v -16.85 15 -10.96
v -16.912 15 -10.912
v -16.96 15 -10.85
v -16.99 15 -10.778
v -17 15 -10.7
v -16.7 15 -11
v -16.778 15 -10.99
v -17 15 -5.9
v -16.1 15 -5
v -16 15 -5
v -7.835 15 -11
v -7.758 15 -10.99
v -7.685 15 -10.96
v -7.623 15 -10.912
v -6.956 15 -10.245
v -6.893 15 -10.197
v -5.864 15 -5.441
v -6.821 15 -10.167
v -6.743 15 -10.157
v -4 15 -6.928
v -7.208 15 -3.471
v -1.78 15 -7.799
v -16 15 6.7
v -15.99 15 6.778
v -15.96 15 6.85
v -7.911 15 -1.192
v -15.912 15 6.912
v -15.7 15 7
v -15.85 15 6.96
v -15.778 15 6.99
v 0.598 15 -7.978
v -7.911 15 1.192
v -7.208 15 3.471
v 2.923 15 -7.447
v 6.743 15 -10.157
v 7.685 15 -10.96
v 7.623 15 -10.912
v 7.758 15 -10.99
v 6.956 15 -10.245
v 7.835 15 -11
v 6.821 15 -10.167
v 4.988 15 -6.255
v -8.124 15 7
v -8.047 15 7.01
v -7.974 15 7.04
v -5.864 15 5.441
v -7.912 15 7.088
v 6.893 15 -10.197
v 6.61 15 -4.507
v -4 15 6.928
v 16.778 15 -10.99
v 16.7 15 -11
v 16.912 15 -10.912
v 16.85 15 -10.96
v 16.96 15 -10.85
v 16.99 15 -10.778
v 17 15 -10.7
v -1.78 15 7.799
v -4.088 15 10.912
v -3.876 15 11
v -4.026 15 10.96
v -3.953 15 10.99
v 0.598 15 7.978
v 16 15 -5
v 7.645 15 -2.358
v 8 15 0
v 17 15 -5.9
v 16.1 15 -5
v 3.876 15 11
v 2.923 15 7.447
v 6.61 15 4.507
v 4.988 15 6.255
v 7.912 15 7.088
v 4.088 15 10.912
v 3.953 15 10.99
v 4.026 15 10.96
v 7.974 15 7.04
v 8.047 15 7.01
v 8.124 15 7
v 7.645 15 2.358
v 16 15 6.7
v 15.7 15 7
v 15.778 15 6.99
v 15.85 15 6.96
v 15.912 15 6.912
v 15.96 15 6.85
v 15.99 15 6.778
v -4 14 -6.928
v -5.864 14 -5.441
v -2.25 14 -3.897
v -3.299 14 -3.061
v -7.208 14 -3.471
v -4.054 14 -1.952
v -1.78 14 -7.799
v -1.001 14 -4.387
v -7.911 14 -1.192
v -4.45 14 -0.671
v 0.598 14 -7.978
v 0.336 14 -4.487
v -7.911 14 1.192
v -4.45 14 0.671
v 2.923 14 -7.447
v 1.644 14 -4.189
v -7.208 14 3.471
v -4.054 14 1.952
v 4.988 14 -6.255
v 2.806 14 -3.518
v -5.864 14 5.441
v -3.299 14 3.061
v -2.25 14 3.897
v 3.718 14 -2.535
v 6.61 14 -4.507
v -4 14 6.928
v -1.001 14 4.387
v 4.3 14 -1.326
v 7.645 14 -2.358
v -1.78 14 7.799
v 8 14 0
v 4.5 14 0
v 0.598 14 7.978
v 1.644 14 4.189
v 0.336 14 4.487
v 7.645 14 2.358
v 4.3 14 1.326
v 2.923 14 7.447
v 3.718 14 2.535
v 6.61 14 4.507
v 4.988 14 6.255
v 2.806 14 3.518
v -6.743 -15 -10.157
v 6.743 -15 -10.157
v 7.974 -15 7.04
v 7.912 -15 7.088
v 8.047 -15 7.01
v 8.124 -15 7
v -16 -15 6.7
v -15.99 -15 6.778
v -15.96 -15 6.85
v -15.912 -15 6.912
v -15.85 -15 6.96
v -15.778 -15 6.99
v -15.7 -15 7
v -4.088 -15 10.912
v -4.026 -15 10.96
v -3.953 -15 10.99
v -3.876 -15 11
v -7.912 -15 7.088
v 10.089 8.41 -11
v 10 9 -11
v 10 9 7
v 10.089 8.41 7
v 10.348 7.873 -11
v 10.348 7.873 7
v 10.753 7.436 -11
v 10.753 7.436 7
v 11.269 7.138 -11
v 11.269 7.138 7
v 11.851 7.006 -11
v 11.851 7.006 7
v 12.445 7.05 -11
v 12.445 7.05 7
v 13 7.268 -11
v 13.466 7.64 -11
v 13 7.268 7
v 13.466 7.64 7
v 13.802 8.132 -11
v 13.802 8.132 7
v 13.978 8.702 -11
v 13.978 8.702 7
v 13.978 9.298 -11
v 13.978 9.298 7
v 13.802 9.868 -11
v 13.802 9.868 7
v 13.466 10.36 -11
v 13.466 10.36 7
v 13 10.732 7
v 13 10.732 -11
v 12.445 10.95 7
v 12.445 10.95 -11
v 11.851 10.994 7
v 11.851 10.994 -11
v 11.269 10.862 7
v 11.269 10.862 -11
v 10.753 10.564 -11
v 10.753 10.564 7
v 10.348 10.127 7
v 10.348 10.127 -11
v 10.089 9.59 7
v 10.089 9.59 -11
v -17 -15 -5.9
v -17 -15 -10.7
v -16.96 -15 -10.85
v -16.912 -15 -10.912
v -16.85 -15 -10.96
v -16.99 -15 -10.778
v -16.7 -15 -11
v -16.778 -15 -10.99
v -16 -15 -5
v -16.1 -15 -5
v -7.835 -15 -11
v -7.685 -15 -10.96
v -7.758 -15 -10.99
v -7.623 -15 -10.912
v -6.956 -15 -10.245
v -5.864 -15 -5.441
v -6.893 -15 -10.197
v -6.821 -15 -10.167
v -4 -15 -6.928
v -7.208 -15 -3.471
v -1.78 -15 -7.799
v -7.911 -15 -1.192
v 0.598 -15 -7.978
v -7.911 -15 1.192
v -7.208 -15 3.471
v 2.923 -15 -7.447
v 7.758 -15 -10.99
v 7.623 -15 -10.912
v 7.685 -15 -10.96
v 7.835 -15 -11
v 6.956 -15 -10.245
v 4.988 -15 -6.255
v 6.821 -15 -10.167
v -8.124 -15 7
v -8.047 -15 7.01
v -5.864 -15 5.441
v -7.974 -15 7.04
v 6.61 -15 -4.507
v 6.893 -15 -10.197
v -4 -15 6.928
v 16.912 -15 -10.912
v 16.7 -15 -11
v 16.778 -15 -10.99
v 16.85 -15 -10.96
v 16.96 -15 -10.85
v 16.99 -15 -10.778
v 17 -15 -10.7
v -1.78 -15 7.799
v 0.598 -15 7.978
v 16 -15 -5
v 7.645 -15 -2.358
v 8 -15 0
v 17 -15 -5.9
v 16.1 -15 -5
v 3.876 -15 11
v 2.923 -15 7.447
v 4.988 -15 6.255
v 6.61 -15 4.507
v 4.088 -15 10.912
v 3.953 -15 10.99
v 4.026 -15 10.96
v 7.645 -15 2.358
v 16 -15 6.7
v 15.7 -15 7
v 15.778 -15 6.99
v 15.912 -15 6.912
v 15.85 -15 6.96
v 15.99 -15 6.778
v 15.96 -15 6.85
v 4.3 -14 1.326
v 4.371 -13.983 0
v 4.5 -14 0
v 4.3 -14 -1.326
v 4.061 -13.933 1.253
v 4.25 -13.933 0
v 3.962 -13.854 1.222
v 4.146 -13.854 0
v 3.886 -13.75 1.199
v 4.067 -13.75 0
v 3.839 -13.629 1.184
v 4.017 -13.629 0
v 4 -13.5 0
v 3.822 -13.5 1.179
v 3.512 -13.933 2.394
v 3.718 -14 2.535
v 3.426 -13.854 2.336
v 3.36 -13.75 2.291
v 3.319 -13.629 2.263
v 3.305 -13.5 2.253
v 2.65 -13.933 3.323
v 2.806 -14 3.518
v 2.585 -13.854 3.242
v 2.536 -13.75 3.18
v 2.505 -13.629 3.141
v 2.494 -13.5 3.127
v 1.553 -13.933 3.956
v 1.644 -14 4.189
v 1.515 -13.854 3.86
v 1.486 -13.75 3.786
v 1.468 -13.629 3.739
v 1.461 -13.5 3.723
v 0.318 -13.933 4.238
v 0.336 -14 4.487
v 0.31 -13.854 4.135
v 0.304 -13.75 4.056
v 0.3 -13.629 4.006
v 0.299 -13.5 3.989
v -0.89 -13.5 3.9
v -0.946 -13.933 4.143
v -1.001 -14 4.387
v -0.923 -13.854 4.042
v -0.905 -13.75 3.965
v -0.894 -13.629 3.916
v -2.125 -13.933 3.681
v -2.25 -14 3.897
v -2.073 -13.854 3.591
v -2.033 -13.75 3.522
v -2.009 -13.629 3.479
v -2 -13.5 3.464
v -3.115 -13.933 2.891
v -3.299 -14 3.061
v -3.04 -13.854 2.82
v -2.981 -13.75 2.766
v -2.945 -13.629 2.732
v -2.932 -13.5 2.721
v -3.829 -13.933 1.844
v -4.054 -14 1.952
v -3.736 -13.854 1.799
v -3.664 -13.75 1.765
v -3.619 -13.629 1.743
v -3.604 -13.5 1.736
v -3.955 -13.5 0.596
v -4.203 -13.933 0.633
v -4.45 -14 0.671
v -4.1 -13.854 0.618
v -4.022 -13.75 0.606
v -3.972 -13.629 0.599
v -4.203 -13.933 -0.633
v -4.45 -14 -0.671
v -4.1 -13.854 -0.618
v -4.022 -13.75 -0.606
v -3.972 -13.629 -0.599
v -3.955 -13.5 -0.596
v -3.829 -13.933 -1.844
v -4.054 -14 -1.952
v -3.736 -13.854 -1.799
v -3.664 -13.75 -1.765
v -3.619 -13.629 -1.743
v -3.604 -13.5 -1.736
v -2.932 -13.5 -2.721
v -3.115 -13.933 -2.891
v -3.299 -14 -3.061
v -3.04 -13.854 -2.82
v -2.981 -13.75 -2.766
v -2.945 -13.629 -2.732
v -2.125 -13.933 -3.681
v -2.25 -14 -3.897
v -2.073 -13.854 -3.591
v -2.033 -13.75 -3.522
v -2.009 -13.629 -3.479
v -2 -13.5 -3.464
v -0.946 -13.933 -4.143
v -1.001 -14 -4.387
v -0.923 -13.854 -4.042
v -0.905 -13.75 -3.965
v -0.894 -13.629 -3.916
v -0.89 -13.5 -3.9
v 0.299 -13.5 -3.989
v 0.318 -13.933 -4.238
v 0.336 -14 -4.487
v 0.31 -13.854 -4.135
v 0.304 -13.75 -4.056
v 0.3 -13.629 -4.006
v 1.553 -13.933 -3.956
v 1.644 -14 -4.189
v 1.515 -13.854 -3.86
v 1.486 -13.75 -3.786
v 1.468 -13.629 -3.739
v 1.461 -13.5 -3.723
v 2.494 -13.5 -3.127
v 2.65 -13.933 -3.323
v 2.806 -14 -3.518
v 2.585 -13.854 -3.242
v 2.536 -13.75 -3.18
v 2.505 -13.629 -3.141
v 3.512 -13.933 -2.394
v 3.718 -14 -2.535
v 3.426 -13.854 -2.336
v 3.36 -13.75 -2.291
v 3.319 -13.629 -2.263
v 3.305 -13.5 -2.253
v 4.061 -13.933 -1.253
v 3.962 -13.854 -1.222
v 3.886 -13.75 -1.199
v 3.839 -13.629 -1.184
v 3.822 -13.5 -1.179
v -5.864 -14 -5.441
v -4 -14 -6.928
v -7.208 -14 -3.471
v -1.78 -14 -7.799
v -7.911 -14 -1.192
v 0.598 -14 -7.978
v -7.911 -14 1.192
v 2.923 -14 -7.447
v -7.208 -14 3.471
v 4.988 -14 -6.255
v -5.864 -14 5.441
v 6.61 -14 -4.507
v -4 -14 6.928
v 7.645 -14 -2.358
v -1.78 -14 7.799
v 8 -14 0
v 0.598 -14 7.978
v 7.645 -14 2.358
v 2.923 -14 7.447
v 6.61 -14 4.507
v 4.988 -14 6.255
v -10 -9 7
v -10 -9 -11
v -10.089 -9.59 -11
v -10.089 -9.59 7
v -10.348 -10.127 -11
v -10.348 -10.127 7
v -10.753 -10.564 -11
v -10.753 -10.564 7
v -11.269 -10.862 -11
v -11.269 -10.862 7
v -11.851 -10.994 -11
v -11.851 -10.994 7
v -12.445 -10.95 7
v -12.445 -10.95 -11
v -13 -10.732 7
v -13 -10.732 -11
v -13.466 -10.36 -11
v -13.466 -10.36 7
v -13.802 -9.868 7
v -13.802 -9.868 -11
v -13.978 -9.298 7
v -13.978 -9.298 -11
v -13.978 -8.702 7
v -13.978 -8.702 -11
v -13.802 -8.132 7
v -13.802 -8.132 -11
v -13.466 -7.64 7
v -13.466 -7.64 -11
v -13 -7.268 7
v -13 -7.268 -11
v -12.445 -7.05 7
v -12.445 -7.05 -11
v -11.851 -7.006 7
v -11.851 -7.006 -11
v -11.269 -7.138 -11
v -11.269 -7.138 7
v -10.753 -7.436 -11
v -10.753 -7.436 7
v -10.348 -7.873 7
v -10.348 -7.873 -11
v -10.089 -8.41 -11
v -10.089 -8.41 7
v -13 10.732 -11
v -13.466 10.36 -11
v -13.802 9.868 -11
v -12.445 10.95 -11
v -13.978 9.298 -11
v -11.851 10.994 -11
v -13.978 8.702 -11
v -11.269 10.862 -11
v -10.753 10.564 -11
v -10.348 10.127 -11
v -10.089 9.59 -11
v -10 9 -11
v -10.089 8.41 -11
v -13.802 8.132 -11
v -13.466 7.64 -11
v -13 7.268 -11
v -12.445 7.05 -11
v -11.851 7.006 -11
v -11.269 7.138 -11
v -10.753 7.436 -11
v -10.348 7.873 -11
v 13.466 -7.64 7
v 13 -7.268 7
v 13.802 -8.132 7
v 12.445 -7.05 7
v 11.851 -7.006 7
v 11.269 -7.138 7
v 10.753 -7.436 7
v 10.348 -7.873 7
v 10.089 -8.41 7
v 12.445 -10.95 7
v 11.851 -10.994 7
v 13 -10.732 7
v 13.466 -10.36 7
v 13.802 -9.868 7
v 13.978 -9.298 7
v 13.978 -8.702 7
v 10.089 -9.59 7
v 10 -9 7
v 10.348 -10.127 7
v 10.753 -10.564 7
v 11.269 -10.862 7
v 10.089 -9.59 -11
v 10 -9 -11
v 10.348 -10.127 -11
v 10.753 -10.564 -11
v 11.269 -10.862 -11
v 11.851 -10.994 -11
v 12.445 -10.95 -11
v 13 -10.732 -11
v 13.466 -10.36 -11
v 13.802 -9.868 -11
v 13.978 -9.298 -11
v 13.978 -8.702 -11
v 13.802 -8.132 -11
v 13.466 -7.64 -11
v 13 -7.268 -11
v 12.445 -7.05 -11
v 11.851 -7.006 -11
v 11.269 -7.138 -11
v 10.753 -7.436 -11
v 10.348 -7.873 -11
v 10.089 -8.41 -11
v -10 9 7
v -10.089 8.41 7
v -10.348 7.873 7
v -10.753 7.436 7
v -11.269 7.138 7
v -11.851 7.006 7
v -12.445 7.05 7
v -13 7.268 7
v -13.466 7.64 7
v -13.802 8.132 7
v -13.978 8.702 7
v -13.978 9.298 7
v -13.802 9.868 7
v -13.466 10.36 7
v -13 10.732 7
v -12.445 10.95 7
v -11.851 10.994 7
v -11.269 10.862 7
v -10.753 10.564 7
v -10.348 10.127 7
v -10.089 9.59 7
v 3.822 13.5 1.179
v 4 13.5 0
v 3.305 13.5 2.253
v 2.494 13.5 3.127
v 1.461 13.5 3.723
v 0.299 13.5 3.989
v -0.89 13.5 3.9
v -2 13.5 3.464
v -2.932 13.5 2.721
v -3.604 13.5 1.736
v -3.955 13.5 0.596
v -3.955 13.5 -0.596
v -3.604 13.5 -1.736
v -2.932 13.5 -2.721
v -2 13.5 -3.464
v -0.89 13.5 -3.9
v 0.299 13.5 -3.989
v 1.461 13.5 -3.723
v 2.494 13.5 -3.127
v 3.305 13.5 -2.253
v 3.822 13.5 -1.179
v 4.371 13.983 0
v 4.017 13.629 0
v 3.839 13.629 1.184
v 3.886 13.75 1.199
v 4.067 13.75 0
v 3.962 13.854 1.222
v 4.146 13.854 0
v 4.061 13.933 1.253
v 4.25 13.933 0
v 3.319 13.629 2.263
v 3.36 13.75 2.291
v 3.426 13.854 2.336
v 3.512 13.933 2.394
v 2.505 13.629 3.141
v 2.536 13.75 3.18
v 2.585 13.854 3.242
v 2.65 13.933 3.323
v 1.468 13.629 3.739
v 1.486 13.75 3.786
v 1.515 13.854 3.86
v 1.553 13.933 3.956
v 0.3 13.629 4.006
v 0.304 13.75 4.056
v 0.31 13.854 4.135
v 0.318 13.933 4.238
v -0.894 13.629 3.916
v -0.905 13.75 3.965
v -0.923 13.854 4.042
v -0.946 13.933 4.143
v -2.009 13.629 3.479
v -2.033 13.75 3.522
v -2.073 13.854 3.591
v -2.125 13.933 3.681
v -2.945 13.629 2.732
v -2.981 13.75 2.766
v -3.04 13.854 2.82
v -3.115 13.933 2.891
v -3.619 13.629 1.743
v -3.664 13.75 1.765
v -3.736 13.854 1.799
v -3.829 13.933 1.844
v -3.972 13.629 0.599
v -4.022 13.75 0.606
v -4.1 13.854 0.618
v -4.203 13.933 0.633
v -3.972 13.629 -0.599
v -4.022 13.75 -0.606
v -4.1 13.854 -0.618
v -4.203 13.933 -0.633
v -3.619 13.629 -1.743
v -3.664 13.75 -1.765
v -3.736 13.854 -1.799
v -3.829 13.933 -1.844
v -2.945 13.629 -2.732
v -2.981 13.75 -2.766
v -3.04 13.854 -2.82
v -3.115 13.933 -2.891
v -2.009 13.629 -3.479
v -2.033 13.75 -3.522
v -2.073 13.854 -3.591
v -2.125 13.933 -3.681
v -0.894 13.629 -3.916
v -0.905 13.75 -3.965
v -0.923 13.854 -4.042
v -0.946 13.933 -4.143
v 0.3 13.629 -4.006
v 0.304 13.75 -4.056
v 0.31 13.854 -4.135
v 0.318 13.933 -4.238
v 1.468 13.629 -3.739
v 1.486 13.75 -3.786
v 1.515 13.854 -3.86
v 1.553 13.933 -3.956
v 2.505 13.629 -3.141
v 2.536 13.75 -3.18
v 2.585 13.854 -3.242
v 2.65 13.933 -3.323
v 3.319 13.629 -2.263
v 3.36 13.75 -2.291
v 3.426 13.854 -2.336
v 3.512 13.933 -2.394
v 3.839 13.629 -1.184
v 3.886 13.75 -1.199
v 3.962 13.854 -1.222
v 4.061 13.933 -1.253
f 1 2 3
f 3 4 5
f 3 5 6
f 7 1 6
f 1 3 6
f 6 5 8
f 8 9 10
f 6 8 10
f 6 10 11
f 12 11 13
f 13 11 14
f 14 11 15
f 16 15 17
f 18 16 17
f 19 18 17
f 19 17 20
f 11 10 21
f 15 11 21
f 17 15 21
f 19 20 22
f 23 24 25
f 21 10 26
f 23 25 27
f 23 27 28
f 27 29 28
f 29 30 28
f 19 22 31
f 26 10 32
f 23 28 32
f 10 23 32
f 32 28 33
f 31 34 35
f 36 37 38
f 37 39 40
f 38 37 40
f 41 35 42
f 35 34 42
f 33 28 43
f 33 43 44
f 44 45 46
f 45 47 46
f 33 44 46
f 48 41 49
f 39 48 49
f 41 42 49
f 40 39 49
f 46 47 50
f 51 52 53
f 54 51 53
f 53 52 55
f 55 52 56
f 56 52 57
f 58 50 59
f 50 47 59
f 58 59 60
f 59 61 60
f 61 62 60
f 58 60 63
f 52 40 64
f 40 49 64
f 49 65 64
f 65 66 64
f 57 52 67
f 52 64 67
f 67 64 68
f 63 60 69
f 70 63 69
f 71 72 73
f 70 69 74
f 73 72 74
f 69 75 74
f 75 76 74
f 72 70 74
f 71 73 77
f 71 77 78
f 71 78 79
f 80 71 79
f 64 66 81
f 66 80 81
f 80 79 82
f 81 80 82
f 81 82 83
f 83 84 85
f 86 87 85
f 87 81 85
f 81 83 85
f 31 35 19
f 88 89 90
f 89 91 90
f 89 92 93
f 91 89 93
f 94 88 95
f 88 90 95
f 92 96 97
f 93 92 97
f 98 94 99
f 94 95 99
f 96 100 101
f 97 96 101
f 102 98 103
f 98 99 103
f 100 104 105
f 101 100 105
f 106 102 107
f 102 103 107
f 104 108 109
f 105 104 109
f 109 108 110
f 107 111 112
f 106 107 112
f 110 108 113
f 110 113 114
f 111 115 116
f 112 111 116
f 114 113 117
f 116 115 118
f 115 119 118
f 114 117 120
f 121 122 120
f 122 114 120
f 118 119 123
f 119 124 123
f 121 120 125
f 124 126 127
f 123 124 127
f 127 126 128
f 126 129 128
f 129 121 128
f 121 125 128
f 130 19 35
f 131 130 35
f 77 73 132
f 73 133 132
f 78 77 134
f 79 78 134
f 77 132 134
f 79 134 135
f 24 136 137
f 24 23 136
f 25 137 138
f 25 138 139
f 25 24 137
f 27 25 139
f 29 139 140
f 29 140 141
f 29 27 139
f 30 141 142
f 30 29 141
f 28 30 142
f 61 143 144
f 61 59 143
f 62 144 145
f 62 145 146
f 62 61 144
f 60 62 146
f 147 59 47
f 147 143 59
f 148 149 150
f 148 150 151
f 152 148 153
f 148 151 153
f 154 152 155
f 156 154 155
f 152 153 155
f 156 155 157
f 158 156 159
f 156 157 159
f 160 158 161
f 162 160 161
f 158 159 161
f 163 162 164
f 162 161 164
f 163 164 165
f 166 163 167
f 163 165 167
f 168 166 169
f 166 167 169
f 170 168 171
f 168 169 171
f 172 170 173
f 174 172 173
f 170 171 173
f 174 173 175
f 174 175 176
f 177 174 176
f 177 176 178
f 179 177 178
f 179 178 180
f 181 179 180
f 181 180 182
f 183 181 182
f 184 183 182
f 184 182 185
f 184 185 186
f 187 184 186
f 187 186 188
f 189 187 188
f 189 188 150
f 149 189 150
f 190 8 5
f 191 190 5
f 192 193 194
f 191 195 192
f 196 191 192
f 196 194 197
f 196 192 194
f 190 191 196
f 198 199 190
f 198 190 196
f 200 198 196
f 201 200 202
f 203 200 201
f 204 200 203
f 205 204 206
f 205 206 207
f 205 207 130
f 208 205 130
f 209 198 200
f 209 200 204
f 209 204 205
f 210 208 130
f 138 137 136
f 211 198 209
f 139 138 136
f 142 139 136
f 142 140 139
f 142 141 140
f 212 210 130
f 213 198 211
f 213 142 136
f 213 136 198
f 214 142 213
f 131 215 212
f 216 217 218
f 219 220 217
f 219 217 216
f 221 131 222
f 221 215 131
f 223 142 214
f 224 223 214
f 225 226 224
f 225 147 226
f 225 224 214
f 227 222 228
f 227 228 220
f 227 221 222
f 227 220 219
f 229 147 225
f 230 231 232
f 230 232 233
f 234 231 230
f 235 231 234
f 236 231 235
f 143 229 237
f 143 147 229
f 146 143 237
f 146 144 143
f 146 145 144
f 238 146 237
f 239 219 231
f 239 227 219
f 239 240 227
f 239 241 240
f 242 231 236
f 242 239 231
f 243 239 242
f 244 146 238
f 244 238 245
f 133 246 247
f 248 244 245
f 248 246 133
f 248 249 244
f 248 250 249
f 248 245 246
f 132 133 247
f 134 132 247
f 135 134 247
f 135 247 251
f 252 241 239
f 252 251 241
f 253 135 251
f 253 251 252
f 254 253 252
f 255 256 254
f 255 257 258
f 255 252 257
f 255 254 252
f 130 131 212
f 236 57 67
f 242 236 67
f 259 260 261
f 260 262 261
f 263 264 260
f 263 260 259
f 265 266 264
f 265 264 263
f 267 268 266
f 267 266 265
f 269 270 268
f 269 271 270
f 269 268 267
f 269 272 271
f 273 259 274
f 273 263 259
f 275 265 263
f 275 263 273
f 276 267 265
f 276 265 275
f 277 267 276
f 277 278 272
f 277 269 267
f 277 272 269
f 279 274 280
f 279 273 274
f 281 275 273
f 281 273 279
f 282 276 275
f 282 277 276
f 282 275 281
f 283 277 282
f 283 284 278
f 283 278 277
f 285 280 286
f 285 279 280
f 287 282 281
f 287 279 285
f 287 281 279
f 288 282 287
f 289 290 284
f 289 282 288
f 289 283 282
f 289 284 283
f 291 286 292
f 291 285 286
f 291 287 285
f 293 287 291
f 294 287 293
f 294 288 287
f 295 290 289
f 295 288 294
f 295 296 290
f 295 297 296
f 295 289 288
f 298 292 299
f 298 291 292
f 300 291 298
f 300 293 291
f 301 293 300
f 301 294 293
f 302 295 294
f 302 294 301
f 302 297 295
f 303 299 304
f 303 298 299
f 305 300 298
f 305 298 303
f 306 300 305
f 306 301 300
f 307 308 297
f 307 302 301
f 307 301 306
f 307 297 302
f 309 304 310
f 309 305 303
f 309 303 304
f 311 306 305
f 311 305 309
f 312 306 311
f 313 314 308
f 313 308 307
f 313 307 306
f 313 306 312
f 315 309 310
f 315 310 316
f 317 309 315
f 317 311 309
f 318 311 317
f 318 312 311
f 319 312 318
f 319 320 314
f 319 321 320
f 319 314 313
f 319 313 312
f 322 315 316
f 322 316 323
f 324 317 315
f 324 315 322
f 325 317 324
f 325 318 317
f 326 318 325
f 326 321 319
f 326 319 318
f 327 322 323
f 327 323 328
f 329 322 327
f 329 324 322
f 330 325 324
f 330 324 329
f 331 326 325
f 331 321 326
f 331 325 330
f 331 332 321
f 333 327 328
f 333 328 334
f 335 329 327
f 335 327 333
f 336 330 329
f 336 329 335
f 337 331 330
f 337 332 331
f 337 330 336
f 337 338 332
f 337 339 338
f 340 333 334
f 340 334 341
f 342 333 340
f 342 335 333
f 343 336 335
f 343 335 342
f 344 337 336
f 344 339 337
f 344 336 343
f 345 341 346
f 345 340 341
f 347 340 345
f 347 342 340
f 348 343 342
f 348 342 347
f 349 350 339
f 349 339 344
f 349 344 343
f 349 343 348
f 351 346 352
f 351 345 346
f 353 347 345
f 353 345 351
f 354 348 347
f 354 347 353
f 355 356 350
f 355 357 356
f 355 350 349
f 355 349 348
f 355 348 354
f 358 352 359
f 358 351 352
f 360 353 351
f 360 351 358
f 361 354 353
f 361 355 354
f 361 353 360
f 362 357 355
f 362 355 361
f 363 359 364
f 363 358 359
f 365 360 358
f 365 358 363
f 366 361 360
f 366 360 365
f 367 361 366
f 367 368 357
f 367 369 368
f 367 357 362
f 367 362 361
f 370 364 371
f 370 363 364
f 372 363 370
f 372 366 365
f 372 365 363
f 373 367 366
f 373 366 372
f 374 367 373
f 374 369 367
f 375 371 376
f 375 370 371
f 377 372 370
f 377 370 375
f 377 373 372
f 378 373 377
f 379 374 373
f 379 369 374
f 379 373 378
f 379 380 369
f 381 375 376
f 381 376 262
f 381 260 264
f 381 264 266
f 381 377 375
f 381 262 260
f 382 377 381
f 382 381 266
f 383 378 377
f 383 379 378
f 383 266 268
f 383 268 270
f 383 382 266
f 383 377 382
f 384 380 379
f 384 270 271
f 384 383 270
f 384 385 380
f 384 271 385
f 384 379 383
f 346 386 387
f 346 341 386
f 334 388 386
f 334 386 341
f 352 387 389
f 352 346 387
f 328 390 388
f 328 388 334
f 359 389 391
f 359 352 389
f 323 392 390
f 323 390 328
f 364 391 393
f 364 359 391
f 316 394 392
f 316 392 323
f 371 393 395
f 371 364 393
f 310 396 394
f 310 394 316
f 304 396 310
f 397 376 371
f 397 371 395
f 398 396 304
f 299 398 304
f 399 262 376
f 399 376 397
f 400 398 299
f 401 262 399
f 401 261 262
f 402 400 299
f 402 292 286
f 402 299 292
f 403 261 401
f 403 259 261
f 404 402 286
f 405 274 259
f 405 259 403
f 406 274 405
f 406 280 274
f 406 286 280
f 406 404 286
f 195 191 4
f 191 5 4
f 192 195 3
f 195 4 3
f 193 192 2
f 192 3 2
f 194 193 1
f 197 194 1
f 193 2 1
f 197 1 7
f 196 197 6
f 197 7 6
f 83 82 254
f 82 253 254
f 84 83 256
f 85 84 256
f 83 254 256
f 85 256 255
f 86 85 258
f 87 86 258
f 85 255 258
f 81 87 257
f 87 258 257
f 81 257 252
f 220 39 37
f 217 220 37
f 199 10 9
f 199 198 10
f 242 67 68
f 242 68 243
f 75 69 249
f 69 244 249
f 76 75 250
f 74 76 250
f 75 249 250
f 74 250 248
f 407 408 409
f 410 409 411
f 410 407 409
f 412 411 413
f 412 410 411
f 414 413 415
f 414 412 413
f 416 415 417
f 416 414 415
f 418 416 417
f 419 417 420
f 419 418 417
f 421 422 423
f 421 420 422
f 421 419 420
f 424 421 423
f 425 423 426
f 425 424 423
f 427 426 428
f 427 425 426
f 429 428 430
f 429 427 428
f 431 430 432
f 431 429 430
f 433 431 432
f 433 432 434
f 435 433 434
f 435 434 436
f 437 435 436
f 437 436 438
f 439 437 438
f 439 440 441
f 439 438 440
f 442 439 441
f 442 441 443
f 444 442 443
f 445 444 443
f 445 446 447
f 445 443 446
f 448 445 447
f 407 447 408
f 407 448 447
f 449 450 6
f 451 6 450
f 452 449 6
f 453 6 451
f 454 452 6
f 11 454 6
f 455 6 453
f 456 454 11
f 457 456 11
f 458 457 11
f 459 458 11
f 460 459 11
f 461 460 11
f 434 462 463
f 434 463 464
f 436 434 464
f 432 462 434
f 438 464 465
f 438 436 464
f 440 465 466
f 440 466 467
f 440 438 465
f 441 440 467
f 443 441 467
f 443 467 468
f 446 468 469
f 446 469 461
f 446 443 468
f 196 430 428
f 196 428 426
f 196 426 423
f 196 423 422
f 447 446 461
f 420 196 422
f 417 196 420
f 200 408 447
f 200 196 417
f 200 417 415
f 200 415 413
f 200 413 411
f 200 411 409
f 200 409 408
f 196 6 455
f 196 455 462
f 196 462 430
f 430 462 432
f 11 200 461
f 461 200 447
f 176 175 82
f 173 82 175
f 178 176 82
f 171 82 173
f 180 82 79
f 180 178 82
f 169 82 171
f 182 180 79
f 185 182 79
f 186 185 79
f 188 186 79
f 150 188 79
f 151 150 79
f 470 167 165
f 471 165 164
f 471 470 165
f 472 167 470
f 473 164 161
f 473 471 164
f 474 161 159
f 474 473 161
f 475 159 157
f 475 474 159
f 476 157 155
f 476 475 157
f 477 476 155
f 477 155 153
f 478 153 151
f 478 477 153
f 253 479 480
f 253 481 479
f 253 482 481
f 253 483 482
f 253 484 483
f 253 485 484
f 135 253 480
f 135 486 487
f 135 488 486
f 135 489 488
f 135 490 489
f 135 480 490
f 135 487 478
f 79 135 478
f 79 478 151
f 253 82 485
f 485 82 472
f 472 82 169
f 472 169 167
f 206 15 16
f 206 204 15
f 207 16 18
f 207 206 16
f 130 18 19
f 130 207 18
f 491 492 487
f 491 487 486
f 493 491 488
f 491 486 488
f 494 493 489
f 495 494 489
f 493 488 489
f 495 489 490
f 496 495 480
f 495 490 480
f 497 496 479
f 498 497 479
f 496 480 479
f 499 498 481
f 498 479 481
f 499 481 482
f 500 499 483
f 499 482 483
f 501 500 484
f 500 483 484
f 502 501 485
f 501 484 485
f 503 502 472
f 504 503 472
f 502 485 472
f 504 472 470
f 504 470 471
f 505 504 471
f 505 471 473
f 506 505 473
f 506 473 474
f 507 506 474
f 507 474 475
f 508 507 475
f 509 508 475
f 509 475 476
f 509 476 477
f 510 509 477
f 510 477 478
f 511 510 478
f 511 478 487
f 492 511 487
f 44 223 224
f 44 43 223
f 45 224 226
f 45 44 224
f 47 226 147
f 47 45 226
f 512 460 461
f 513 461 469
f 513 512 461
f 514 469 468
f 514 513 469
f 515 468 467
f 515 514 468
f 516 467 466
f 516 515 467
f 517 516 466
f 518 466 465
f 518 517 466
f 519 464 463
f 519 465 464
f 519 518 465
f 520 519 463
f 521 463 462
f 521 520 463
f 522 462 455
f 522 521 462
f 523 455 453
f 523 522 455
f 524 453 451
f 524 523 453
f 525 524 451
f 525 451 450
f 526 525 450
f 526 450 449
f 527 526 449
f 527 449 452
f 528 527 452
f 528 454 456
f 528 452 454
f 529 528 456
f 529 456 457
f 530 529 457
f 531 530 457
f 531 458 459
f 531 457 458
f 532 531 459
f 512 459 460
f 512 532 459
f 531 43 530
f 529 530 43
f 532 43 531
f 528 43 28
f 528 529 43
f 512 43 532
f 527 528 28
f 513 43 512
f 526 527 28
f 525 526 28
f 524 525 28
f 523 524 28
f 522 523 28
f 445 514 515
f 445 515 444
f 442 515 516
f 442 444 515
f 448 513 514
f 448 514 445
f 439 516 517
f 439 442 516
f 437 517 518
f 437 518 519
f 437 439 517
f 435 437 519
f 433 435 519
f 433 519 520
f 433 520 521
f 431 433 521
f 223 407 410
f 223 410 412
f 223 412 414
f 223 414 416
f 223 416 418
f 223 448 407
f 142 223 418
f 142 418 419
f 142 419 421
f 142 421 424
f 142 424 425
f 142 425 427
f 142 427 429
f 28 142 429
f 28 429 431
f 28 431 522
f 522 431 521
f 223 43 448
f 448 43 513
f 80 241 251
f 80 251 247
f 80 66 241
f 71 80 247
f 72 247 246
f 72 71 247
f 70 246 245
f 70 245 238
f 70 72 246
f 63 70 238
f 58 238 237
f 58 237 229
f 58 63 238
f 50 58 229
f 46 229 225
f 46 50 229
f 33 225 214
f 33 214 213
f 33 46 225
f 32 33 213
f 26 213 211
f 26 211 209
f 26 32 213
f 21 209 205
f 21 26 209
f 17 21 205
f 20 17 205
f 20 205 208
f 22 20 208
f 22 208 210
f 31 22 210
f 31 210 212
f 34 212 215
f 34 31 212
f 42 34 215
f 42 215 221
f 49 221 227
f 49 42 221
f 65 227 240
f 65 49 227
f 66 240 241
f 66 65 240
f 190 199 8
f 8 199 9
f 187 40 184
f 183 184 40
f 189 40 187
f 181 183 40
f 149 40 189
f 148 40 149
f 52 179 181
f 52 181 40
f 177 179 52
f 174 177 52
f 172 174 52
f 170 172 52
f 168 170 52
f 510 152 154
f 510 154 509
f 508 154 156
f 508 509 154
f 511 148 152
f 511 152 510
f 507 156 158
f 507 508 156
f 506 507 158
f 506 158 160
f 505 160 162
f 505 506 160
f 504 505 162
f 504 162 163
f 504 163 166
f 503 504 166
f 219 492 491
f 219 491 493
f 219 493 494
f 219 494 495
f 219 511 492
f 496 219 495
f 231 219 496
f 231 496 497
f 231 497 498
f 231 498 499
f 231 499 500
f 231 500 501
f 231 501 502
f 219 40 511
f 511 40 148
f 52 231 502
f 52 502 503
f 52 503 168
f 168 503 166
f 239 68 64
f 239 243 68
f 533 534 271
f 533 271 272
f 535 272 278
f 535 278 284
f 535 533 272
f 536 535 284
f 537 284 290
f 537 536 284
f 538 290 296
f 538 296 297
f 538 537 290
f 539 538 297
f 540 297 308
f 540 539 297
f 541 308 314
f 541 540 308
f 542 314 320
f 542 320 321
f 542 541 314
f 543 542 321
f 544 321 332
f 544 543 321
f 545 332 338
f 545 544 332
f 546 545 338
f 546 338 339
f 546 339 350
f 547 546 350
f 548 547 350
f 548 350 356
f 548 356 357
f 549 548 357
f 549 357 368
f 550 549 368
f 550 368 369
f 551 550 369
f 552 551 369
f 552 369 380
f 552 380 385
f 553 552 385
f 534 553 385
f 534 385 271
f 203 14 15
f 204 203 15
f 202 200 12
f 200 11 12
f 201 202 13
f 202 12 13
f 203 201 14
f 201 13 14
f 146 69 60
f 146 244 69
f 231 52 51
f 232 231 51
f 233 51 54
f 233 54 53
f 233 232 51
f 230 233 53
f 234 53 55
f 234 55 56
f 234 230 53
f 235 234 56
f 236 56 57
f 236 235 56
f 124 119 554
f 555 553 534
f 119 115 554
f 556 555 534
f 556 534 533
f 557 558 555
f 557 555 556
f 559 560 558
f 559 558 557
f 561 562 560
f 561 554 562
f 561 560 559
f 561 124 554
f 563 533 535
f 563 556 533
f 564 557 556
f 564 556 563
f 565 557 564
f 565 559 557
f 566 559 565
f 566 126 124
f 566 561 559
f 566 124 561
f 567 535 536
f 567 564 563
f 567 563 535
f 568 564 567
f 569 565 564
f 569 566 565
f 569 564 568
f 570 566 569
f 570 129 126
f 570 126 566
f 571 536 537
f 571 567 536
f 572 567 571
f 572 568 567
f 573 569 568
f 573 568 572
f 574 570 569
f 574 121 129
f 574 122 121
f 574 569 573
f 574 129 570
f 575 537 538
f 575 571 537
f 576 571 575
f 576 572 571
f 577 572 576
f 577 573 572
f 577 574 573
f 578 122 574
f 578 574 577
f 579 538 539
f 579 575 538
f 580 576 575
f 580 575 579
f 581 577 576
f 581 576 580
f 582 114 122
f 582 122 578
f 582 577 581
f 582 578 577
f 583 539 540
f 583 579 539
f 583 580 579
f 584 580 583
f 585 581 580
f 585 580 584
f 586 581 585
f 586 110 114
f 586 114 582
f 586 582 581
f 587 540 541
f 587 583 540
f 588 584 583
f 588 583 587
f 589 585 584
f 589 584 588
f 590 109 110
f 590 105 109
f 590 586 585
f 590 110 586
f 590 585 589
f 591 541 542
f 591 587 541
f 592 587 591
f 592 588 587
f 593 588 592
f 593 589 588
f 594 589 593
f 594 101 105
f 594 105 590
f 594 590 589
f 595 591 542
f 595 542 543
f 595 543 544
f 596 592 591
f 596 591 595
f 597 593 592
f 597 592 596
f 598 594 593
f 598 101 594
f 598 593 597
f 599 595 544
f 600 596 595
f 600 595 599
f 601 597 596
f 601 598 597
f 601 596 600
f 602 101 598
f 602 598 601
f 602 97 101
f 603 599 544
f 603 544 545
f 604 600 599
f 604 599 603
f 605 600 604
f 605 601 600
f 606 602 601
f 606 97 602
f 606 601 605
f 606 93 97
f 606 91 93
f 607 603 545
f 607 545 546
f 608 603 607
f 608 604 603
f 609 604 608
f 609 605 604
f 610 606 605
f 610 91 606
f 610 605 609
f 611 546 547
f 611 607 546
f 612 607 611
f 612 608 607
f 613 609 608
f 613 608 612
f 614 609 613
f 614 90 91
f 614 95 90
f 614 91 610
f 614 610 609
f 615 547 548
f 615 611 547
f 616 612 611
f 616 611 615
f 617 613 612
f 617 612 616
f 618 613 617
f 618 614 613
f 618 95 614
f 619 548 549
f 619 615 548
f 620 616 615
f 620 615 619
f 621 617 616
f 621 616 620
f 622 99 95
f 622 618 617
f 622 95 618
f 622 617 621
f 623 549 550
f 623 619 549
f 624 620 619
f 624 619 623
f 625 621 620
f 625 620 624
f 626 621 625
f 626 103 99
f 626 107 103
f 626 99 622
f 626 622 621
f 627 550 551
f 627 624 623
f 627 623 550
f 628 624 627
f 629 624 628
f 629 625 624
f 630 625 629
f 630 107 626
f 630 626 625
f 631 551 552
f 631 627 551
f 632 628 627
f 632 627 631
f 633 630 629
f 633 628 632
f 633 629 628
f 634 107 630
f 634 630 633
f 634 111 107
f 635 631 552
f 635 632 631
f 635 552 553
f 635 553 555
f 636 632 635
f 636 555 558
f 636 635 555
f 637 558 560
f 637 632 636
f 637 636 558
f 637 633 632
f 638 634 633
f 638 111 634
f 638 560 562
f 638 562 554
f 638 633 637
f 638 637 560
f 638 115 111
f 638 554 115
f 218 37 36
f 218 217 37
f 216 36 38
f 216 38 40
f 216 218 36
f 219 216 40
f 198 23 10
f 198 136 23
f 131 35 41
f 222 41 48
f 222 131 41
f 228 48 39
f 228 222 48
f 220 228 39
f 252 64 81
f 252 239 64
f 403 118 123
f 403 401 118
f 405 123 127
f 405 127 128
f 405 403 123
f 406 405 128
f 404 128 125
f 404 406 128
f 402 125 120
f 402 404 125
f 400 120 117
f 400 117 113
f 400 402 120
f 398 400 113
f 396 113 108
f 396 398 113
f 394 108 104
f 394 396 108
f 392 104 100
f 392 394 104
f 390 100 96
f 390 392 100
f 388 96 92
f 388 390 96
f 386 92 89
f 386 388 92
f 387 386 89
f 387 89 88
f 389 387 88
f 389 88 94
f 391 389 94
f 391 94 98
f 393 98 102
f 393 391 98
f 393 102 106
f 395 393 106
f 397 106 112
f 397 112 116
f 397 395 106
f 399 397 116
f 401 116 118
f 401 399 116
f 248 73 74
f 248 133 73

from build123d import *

# Parameters (mm, degrees)
SKETCH_R        = 8
PAD_DEPTH       = 15
POCKET_DEPTH    = 35
CHAMFER_SIZE    = 0.9
FILLET_R        = 0.3
SKETCH002_R     = 2
POCKET001_DEPTH = 20
SKETCH003_R     = 8
SKETCH003_R_2   = 4
PAD001_DEPTH    = 14
FILLET001_R     = 0.5


with BuildPart() as body:
    # Sketch → Pad (new body, symmetric)
    with BuildSketch(Plane.XZ):
        Polygon((-17, -11), (17, -11), (17, -5), (16, -5), (16, 7), (8, 7), (4, 11), (-4, 11), (-8, 7), (-16, 7), (-16, -5), (-17, -5), align=None)
        Circle(SKETCH_R, mode=Mode.SUBTRACT)
    extrude(amount=PAD_DEPTH, both=True)

    # Sketch001 → Pocket (cut)
    with BuildSketch(Plane(origin=(0, 15, 0), x_dir=(1, 0, 0), z_dir=(0, 1, 0))):
        Polygon((-8, 12.156693), (-8, 11.288945), (-6.867748, 10.156693), (6.867748, 10.156693), (8, 11.288945), (8, 12.156693), align=None)
    extrude(amount=-POCKET_DEPTH, mode=Mode.SUBTRACT)

    # Chamfer
    chamfer_edges = [body.edges().sort_by_distance(p)[0] for p in [
        (17, 0, -5),
        (-17, 0, -5),
    ]]
    chamfer(chamfer_edges, length=CHAMFER_SIZE)

    # Fillet
    fillet_edges = [body.edges().sort_by_distance(p)[0] for p in [
        (-17, 0, -11),
        (17, 0, -11),
        (7.711055, 0, -11),
        (6.867748, 0, -10.156693),
        (-6.867748, 0, -10.156693),
        (-7.711055, 0, -11),
        (16, 0, 7),
        (-16, 0, 7),
        (4, 0, 11),
        (-4, 0, 11),
        (-8, 0, 7),
        (8, 0, 7),
    ]]
    fillet(fillet_edges, radius=FILLET_R)

    # Sketch002 (on Face28 of Fillet) → Pocket001 (cut)
    with BuildSketch(Plane(origin=(0, 0, 7), x_dir=(-1, 0, 0), z_dir=(0, 0, 1))):
        with Locations((-12, -9)):
            Circle(SKETCH002_R)
        with Locations((-12, 9)):
            Circle(SKETCH002_R)
    pocket001 = extrude(amount=-POCKET001_DEPTH, mode=Mode.SUBTRACT)

    # Mirrored: Pocket001 across Sketch002 V_Axis
    add(pocket001.mirror(Plane(origin=(0, 0, 7), x_dir=(0, 0, 1), z_dir=(-1, 0, 0))), mode=Mode.SUBTRACT)


with BuildPart() as body001:
    # Sketch003 → Pad001 (new body, symmetric)
    with BuildSketch(Plane.XZ):
        Circle(SKETCH003_R)
        Circle(SKETCH003_R_2, mode=Mode.SUBTRACT)
    extrude(amount=PAD001_DEPTH, both=True)

    # Fillet001
    fillet001_edges = [body001.edges().sort_by_distance(p)[0] for p in [
        (-4, -14, 0),
        (-4, 14, 0),
    ]]
    fillet(fillet001_edges, radius=FILLET001_R)


solid = Compound([body.part, body001.part])
